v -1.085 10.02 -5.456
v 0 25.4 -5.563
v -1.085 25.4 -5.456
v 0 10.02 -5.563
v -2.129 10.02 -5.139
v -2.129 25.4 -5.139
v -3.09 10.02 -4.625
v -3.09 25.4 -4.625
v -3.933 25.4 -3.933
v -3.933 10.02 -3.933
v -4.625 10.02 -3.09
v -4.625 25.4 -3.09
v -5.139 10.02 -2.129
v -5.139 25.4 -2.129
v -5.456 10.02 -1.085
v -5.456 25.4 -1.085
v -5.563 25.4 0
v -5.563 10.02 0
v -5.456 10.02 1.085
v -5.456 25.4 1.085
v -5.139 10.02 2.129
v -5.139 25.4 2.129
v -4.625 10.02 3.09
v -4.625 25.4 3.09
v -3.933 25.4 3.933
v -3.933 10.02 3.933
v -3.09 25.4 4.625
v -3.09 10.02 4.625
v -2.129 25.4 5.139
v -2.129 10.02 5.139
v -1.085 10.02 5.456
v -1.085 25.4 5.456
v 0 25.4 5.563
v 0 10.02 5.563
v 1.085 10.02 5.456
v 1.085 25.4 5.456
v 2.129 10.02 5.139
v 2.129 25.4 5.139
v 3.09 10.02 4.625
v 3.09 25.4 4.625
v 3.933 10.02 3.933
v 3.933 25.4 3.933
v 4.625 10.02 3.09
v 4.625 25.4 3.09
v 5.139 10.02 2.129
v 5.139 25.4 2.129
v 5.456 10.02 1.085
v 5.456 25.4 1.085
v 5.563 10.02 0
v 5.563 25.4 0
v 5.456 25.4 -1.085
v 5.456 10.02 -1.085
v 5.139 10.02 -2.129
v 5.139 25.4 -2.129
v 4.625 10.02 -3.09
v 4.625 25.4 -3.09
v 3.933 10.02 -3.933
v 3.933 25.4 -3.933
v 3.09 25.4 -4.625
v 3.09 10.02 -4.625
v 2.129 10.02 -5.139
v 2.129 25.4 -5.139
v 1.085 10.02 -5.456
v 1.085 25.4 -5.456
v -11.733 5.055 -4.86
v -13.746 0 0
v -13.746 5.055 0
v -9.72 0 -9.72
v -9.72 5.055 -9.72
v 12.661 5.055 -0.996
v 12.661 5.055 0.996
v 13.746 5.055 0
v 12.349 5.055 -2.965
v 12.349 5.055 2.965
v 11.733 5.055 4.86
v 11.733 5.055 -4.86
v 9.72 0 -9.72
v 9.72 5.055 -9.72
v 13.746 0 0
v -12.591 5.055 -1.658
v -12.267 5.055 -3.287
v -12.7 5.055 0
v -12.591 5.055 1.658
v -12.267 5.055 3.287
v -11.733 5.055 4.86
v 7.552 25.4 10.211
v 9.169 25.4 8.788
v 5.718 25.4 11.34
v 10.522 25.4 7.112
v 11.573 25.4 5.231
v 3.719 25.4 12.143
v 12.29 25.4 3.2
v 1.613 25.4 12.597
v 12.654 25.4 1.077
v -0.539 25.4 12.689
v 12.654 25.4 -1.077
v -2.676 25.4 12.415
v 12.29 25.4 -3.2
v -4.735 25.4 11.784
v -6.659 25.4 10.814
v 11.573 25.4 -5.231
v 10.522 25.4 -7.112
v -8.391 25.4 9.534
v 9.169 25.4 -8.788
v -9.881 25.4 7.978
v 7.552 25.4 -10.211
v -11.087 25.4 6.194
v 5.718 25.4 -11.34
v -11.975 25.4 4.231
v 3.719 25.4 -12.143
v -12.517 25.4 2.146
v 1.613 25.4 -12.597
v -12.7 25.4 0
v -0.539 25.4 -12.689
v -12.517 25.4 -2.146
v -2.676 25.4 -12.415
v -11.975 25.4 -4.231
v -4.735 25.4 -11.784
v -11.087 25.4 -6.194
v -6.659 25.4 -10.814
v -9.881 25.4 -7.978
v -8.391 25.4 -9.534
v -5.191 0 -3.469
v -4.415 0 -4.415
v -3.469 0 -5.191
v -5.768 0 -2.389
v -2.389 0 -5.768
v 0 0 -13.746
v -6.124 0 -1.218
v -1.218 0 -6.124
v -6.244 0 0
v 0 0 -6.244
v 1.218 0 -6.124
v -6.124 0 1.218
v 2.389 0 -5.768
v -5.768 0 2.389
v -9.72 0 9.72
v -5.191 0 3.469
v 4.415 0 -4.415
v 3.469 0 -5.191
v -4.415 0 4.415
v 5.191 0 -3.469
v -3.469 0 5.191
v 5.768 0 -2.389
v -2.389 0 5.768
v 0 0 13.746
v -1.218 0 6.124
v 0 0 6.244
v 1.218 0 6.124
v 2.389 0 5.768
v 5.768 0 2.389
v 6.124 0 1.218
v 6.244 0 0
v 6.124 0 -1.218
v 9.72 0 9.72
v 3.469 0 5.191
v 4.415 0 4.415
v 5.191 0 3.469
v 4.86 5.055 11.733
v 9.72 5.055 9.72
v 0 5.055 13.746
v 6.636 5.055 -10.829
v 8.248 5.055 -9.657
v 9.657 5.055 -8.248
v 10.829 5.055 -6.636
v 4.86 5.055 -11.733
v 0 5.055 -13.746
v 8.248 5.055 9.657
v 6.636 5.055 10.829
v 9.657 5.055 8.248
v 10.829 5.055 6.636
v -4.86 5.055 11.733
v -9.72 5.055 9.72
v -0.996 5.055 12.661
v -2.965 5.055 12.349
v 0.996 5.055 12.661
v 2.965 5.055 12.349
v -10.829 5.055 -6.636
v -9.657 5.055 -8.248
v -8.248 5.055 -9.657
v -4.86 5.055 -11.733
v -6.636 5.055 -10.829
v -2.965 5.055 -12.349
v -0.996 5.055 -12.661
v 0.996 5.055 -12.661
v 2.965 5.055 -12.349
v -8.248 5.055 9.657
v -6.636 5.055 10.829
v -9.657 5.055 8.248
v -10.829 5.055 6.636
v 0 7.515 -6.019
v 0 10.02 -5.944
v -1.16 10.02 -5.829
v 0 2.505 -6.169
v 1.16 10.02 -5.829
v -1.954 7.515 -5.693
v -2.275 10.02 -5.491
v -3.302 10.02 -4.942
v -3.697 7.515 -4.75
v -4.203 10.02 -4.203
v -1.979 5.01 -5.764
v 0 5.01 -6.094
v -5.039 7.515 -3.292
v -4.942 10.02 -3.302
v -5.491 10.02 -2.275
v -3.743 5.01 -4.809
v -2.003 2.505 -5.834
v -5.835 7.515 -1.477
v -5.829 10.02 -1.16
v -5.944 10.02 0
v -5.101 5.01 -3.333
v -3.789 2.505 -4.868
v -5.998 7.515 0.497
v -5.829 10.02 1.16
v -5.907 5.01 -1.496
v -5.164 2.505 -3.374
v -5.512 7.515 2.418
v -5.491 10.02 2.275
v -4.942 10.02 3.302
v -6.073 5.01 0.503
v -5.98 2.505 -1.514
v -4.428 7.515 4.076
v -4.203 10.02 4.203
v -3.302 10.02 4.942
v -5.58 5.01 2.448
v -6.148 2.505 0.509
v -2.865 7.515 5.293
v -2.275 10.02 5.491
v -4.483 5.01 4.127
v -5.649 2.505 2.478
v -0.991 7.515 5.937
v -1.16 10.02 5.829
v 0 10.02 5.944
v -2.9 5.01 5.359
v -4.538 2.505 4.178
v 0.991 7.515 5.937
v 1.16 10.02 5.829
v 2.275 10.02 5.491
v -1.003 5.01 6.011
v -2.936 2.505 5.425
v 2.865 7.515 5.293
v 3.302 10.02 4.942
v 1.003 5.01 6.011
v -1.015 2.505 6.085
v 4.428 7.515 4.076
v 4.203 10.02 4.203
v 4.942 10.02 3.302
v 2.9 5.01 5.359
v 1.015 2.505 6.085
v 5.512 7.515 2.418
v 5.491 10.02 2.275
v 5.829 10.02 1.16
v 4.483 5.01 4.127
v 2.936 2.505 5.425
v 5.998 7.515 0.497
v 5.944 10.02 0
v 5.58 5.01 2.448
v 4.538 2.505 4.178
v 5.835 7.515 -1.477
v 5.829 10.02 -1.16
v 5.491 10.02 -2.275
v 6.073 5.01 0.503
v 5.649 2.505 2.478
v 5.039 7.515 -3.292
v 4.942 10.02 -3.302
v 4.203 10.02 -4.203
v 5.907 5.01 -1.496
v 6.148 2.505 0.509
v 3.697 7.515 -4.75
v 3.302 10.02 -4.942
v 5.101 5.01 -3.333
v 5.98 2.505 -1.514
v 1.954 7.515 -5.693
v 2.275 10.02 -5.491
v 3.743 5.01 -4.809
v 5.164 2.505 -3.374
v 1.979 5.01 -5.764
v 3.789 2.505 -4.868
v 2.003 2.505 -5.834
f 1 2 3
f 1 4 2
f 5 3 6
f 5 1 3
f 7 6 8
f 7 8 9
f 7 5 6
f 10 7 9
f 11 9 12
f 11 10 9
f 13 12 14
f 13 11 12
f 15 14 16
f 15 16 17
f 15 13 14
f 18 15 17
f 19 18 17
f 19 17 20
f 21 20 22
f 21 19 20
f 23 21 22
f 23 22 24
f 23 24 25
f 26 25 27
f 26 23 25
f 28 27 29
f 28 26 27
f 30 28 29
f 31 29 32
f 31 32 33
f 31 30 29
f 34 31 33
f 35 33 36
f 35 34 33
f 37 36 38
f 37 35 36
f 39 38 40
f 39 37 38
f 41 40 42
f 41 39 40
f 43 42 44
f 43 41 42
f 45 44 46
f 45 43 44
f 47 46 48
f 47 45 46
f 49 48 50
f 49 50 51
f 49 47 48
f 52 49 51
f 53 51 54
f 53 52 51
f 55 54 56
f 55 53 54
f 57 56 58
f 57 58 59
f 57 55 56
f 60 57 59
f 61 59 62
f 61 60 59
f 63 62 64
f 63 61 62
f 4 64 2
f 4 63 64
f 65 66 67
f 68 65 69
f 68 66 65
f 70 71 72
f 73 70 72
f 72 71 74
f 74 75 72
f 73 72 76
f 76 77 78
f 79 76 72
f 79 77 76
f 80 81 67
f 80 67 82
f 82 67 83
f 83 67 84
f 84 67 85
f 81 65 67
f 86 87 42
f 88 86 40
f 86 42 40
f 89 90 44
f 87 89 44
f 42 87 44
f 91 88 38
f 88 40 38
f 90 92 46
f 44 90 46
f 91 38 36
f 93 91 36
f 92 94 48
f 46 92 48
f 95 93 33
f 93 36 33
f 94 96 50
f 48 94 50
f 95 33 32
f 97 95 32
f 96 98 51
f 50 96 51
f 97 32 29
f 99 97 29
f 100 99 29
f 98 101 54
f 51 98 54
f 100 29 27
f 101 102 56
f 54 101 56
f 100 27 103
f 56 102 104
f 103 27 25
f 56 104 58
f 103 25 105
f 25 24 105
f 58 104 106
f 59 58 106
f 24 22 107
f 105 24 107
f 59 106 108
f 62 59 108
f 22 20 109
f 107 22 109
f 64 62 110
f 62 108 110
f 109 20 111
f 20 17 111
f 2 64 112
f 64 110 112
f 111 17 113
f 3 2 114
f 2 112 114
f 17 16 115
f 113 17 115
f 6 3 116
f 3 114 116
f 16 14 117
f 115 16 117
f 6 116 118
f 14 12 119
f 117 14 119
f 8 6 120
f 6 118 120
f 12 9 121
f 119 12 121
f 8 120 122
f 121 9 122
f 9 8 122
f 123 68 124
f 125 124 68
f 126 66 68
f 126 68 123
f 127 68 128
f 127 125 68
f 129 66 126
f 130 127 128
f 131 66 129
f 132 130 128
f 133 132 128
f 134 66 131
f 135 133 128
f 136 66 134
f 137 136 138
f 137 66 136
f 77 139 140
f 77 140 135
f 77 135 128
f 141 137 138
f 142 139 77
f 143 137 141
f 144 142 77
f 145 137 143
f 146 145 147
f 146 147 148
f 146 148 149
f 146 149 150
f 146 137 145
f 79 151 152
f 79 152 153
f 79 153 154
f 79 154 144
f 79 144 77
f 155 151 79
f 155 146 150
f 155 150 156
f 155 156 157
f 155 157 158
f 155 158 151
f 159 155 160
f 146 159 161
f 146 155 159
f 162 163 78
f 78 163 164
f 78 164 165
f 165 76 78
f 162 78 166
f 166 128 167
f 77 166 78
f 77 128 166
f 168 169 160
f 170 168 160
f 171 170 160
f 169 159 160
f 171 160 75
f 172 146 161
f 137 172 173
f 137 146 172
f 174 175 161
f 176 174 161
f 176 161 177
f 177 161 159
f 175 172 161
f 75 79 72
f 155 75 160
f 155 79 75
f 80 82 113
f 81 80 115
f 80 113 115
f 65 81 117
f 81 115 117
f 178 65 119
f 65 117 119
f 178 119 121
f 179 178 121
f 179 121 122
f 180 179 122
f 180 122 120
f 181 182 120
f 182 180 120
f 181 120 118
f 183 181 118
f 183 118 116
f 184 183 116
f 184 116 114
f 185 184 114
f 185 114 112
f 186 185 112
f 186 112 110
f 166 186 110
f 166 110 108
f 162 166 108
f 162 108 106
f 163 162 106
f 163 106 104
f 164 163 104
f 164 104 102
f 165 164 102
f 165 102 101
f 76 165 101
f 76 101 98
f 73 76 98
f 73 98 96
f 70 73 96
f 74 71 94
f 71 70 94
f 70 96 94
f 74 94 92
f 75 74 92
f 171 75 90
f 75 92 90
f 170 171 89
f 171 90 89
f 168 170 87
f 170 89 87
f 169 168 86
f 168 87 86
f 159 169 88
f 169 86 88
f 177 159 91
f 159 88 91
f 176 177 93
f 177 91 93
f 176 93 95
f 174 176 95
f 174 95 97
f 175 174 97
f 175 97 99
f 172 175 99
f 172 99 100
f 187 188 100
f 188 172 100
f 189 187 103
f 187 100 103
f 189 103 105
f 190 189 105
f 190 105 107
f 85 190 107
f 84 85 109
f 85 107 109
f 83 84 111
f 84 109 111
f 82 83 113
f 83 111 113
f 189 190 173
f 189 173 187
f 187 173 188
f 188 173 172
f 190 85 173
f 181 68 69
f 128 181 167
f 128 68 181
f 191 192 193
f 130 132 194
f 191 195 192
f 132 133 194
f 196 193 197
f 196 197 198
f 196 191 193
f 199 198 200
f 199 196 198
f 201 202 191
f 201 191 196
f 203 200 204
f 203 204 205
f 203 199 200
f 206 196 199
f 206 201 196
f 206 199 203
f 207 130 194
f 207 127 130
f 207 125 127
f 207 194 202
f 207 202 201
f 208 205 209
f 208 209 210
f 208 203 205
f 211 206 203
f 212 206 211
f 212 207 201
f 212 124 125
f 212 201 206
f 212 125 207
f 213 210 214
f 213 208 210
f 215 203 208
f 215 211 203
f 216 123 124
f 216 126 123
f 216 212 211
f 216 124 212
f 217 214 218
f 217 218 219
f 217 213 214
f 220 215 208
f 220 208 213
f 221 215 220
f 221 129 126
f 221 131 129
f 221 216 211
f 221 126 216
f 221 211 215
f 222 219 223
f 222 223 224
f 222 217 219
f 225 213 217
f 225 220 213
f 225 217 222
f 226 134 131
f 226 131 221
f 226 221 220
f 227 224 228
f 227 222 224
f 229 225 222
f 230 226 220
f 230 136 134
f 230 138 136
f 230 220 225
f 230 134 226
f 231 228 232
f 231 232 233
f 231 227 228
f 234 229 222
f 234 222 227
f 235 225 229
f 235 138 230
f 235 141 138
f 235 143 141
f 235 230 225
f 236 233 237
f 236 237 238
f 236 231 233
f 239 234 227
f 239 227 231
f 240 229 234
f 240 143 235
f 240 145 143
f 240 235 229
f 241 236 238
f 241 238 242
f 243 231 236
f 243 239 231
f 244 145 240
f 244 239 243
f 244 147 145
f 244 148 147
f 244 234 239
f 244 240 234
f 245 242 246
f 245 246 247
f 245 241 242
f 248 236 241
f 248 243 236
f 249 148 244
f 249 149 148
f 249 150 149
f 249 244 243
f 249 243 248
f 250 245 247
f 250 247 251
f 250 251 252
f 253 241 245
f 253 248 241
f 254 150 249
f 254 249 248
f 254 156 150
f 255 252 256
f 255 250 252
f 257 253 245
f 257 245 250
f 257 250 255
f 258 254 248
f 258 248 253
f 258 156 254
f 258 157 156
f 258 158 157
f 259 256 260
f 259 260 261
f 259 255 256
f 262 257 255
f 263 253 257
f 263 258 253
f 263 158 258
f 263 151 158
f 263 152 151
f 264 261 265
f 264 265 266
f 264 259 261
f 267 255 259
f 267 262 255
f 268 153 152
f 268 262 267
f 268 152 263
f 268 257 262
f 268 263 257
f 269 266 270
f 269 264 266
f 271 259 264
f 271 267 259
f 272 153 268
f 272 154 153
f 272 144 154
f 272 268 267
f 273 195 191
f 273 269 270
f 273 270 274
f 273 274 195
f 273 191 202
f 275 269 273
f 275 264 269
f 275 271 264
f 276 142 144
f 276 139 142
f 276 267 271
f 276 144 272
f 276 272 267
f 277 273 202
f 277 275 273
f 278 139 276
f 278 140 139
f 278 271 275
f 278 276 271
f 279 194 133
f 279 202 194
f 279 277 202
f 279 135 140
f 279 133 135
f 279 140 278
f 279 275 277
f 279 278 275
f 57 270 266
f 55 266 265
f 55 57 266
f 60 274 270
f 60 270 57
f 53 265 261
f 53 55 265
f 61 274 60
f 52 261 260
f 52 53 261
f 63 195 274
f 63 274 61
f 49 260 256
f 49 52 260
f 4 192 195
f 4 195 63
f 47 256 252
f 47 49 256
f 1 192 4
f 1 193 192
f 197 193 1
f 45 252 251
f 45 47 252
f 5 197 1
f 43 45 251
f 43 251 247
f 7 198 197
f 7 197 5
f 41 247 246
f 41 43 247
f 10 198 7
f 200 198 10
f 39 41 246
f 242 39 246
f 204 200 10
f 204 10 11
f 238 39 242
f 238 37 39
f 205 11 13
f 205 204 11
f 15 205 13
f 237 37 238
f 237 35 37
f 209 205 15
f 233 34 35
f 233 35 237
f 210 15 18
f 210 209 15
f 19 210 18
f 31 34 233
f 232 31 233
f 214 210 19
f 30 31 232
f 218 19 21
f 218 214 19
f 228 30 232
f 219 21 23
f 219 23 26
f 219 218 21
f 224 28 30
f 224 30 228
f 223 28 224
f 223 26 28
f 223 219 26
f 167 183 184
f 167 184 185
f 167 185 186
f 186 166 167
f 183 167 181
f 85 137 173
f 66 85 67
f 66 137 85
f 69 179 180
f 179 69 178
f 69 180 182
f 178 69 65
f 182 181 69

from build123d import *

# Parameters (mm, degrees)
SKETCH1_W           = 12.7
SKETCH1_H           = 25.4
BOSS_EXTRUDE1_DEPTH = 5.0546


with BuildPart() as part:
    # Sketch1 → Revolve1 (revolve)
    with BuildSketch(Plane.XY):
        with Locations((-6.35, 12.7)):
            Rectangle(SKETCH1_W, SKETCH1_H)
    revolve(axis=Axis((0, 0, 0), (0, -1, 0)))

    # Sketch2 → Boss-Extrude1 (add)
    with BuildSketch(Plane.XZ):
        Polygon((0, 13.746380944), (-9.720159182, 9.720159182), (-13.746380944, 0), (-9.720159182, -9.720159182), (0, -13.746380944), (9.720159182, -9.720159182), (13.746380944, 0), (9.720159182, 9.720159182), align=None)
    extrude(amount=-BOSS_EXTRUDE1_DEPTH)

    # Sketch4 → 1/4 NPT Tapped Hole1 (revolve, cut)
    with BuildSketch(Plane(origin=(0, 0, 0), x_dir=(0, 0, -1), z_dir=(1, 0, 0))):
        Polygon((0, 0), (0, 25.4), (5.5626, 25.4), (5.5626, 10.0203), (5.943679799, 10.0203), (6.243701, 0), align=None)
    revolve(axis=Axis((0, -6.35, 0), (0, 1, 0)), mode=Mode.SUBTRACT)


solid = part.part
